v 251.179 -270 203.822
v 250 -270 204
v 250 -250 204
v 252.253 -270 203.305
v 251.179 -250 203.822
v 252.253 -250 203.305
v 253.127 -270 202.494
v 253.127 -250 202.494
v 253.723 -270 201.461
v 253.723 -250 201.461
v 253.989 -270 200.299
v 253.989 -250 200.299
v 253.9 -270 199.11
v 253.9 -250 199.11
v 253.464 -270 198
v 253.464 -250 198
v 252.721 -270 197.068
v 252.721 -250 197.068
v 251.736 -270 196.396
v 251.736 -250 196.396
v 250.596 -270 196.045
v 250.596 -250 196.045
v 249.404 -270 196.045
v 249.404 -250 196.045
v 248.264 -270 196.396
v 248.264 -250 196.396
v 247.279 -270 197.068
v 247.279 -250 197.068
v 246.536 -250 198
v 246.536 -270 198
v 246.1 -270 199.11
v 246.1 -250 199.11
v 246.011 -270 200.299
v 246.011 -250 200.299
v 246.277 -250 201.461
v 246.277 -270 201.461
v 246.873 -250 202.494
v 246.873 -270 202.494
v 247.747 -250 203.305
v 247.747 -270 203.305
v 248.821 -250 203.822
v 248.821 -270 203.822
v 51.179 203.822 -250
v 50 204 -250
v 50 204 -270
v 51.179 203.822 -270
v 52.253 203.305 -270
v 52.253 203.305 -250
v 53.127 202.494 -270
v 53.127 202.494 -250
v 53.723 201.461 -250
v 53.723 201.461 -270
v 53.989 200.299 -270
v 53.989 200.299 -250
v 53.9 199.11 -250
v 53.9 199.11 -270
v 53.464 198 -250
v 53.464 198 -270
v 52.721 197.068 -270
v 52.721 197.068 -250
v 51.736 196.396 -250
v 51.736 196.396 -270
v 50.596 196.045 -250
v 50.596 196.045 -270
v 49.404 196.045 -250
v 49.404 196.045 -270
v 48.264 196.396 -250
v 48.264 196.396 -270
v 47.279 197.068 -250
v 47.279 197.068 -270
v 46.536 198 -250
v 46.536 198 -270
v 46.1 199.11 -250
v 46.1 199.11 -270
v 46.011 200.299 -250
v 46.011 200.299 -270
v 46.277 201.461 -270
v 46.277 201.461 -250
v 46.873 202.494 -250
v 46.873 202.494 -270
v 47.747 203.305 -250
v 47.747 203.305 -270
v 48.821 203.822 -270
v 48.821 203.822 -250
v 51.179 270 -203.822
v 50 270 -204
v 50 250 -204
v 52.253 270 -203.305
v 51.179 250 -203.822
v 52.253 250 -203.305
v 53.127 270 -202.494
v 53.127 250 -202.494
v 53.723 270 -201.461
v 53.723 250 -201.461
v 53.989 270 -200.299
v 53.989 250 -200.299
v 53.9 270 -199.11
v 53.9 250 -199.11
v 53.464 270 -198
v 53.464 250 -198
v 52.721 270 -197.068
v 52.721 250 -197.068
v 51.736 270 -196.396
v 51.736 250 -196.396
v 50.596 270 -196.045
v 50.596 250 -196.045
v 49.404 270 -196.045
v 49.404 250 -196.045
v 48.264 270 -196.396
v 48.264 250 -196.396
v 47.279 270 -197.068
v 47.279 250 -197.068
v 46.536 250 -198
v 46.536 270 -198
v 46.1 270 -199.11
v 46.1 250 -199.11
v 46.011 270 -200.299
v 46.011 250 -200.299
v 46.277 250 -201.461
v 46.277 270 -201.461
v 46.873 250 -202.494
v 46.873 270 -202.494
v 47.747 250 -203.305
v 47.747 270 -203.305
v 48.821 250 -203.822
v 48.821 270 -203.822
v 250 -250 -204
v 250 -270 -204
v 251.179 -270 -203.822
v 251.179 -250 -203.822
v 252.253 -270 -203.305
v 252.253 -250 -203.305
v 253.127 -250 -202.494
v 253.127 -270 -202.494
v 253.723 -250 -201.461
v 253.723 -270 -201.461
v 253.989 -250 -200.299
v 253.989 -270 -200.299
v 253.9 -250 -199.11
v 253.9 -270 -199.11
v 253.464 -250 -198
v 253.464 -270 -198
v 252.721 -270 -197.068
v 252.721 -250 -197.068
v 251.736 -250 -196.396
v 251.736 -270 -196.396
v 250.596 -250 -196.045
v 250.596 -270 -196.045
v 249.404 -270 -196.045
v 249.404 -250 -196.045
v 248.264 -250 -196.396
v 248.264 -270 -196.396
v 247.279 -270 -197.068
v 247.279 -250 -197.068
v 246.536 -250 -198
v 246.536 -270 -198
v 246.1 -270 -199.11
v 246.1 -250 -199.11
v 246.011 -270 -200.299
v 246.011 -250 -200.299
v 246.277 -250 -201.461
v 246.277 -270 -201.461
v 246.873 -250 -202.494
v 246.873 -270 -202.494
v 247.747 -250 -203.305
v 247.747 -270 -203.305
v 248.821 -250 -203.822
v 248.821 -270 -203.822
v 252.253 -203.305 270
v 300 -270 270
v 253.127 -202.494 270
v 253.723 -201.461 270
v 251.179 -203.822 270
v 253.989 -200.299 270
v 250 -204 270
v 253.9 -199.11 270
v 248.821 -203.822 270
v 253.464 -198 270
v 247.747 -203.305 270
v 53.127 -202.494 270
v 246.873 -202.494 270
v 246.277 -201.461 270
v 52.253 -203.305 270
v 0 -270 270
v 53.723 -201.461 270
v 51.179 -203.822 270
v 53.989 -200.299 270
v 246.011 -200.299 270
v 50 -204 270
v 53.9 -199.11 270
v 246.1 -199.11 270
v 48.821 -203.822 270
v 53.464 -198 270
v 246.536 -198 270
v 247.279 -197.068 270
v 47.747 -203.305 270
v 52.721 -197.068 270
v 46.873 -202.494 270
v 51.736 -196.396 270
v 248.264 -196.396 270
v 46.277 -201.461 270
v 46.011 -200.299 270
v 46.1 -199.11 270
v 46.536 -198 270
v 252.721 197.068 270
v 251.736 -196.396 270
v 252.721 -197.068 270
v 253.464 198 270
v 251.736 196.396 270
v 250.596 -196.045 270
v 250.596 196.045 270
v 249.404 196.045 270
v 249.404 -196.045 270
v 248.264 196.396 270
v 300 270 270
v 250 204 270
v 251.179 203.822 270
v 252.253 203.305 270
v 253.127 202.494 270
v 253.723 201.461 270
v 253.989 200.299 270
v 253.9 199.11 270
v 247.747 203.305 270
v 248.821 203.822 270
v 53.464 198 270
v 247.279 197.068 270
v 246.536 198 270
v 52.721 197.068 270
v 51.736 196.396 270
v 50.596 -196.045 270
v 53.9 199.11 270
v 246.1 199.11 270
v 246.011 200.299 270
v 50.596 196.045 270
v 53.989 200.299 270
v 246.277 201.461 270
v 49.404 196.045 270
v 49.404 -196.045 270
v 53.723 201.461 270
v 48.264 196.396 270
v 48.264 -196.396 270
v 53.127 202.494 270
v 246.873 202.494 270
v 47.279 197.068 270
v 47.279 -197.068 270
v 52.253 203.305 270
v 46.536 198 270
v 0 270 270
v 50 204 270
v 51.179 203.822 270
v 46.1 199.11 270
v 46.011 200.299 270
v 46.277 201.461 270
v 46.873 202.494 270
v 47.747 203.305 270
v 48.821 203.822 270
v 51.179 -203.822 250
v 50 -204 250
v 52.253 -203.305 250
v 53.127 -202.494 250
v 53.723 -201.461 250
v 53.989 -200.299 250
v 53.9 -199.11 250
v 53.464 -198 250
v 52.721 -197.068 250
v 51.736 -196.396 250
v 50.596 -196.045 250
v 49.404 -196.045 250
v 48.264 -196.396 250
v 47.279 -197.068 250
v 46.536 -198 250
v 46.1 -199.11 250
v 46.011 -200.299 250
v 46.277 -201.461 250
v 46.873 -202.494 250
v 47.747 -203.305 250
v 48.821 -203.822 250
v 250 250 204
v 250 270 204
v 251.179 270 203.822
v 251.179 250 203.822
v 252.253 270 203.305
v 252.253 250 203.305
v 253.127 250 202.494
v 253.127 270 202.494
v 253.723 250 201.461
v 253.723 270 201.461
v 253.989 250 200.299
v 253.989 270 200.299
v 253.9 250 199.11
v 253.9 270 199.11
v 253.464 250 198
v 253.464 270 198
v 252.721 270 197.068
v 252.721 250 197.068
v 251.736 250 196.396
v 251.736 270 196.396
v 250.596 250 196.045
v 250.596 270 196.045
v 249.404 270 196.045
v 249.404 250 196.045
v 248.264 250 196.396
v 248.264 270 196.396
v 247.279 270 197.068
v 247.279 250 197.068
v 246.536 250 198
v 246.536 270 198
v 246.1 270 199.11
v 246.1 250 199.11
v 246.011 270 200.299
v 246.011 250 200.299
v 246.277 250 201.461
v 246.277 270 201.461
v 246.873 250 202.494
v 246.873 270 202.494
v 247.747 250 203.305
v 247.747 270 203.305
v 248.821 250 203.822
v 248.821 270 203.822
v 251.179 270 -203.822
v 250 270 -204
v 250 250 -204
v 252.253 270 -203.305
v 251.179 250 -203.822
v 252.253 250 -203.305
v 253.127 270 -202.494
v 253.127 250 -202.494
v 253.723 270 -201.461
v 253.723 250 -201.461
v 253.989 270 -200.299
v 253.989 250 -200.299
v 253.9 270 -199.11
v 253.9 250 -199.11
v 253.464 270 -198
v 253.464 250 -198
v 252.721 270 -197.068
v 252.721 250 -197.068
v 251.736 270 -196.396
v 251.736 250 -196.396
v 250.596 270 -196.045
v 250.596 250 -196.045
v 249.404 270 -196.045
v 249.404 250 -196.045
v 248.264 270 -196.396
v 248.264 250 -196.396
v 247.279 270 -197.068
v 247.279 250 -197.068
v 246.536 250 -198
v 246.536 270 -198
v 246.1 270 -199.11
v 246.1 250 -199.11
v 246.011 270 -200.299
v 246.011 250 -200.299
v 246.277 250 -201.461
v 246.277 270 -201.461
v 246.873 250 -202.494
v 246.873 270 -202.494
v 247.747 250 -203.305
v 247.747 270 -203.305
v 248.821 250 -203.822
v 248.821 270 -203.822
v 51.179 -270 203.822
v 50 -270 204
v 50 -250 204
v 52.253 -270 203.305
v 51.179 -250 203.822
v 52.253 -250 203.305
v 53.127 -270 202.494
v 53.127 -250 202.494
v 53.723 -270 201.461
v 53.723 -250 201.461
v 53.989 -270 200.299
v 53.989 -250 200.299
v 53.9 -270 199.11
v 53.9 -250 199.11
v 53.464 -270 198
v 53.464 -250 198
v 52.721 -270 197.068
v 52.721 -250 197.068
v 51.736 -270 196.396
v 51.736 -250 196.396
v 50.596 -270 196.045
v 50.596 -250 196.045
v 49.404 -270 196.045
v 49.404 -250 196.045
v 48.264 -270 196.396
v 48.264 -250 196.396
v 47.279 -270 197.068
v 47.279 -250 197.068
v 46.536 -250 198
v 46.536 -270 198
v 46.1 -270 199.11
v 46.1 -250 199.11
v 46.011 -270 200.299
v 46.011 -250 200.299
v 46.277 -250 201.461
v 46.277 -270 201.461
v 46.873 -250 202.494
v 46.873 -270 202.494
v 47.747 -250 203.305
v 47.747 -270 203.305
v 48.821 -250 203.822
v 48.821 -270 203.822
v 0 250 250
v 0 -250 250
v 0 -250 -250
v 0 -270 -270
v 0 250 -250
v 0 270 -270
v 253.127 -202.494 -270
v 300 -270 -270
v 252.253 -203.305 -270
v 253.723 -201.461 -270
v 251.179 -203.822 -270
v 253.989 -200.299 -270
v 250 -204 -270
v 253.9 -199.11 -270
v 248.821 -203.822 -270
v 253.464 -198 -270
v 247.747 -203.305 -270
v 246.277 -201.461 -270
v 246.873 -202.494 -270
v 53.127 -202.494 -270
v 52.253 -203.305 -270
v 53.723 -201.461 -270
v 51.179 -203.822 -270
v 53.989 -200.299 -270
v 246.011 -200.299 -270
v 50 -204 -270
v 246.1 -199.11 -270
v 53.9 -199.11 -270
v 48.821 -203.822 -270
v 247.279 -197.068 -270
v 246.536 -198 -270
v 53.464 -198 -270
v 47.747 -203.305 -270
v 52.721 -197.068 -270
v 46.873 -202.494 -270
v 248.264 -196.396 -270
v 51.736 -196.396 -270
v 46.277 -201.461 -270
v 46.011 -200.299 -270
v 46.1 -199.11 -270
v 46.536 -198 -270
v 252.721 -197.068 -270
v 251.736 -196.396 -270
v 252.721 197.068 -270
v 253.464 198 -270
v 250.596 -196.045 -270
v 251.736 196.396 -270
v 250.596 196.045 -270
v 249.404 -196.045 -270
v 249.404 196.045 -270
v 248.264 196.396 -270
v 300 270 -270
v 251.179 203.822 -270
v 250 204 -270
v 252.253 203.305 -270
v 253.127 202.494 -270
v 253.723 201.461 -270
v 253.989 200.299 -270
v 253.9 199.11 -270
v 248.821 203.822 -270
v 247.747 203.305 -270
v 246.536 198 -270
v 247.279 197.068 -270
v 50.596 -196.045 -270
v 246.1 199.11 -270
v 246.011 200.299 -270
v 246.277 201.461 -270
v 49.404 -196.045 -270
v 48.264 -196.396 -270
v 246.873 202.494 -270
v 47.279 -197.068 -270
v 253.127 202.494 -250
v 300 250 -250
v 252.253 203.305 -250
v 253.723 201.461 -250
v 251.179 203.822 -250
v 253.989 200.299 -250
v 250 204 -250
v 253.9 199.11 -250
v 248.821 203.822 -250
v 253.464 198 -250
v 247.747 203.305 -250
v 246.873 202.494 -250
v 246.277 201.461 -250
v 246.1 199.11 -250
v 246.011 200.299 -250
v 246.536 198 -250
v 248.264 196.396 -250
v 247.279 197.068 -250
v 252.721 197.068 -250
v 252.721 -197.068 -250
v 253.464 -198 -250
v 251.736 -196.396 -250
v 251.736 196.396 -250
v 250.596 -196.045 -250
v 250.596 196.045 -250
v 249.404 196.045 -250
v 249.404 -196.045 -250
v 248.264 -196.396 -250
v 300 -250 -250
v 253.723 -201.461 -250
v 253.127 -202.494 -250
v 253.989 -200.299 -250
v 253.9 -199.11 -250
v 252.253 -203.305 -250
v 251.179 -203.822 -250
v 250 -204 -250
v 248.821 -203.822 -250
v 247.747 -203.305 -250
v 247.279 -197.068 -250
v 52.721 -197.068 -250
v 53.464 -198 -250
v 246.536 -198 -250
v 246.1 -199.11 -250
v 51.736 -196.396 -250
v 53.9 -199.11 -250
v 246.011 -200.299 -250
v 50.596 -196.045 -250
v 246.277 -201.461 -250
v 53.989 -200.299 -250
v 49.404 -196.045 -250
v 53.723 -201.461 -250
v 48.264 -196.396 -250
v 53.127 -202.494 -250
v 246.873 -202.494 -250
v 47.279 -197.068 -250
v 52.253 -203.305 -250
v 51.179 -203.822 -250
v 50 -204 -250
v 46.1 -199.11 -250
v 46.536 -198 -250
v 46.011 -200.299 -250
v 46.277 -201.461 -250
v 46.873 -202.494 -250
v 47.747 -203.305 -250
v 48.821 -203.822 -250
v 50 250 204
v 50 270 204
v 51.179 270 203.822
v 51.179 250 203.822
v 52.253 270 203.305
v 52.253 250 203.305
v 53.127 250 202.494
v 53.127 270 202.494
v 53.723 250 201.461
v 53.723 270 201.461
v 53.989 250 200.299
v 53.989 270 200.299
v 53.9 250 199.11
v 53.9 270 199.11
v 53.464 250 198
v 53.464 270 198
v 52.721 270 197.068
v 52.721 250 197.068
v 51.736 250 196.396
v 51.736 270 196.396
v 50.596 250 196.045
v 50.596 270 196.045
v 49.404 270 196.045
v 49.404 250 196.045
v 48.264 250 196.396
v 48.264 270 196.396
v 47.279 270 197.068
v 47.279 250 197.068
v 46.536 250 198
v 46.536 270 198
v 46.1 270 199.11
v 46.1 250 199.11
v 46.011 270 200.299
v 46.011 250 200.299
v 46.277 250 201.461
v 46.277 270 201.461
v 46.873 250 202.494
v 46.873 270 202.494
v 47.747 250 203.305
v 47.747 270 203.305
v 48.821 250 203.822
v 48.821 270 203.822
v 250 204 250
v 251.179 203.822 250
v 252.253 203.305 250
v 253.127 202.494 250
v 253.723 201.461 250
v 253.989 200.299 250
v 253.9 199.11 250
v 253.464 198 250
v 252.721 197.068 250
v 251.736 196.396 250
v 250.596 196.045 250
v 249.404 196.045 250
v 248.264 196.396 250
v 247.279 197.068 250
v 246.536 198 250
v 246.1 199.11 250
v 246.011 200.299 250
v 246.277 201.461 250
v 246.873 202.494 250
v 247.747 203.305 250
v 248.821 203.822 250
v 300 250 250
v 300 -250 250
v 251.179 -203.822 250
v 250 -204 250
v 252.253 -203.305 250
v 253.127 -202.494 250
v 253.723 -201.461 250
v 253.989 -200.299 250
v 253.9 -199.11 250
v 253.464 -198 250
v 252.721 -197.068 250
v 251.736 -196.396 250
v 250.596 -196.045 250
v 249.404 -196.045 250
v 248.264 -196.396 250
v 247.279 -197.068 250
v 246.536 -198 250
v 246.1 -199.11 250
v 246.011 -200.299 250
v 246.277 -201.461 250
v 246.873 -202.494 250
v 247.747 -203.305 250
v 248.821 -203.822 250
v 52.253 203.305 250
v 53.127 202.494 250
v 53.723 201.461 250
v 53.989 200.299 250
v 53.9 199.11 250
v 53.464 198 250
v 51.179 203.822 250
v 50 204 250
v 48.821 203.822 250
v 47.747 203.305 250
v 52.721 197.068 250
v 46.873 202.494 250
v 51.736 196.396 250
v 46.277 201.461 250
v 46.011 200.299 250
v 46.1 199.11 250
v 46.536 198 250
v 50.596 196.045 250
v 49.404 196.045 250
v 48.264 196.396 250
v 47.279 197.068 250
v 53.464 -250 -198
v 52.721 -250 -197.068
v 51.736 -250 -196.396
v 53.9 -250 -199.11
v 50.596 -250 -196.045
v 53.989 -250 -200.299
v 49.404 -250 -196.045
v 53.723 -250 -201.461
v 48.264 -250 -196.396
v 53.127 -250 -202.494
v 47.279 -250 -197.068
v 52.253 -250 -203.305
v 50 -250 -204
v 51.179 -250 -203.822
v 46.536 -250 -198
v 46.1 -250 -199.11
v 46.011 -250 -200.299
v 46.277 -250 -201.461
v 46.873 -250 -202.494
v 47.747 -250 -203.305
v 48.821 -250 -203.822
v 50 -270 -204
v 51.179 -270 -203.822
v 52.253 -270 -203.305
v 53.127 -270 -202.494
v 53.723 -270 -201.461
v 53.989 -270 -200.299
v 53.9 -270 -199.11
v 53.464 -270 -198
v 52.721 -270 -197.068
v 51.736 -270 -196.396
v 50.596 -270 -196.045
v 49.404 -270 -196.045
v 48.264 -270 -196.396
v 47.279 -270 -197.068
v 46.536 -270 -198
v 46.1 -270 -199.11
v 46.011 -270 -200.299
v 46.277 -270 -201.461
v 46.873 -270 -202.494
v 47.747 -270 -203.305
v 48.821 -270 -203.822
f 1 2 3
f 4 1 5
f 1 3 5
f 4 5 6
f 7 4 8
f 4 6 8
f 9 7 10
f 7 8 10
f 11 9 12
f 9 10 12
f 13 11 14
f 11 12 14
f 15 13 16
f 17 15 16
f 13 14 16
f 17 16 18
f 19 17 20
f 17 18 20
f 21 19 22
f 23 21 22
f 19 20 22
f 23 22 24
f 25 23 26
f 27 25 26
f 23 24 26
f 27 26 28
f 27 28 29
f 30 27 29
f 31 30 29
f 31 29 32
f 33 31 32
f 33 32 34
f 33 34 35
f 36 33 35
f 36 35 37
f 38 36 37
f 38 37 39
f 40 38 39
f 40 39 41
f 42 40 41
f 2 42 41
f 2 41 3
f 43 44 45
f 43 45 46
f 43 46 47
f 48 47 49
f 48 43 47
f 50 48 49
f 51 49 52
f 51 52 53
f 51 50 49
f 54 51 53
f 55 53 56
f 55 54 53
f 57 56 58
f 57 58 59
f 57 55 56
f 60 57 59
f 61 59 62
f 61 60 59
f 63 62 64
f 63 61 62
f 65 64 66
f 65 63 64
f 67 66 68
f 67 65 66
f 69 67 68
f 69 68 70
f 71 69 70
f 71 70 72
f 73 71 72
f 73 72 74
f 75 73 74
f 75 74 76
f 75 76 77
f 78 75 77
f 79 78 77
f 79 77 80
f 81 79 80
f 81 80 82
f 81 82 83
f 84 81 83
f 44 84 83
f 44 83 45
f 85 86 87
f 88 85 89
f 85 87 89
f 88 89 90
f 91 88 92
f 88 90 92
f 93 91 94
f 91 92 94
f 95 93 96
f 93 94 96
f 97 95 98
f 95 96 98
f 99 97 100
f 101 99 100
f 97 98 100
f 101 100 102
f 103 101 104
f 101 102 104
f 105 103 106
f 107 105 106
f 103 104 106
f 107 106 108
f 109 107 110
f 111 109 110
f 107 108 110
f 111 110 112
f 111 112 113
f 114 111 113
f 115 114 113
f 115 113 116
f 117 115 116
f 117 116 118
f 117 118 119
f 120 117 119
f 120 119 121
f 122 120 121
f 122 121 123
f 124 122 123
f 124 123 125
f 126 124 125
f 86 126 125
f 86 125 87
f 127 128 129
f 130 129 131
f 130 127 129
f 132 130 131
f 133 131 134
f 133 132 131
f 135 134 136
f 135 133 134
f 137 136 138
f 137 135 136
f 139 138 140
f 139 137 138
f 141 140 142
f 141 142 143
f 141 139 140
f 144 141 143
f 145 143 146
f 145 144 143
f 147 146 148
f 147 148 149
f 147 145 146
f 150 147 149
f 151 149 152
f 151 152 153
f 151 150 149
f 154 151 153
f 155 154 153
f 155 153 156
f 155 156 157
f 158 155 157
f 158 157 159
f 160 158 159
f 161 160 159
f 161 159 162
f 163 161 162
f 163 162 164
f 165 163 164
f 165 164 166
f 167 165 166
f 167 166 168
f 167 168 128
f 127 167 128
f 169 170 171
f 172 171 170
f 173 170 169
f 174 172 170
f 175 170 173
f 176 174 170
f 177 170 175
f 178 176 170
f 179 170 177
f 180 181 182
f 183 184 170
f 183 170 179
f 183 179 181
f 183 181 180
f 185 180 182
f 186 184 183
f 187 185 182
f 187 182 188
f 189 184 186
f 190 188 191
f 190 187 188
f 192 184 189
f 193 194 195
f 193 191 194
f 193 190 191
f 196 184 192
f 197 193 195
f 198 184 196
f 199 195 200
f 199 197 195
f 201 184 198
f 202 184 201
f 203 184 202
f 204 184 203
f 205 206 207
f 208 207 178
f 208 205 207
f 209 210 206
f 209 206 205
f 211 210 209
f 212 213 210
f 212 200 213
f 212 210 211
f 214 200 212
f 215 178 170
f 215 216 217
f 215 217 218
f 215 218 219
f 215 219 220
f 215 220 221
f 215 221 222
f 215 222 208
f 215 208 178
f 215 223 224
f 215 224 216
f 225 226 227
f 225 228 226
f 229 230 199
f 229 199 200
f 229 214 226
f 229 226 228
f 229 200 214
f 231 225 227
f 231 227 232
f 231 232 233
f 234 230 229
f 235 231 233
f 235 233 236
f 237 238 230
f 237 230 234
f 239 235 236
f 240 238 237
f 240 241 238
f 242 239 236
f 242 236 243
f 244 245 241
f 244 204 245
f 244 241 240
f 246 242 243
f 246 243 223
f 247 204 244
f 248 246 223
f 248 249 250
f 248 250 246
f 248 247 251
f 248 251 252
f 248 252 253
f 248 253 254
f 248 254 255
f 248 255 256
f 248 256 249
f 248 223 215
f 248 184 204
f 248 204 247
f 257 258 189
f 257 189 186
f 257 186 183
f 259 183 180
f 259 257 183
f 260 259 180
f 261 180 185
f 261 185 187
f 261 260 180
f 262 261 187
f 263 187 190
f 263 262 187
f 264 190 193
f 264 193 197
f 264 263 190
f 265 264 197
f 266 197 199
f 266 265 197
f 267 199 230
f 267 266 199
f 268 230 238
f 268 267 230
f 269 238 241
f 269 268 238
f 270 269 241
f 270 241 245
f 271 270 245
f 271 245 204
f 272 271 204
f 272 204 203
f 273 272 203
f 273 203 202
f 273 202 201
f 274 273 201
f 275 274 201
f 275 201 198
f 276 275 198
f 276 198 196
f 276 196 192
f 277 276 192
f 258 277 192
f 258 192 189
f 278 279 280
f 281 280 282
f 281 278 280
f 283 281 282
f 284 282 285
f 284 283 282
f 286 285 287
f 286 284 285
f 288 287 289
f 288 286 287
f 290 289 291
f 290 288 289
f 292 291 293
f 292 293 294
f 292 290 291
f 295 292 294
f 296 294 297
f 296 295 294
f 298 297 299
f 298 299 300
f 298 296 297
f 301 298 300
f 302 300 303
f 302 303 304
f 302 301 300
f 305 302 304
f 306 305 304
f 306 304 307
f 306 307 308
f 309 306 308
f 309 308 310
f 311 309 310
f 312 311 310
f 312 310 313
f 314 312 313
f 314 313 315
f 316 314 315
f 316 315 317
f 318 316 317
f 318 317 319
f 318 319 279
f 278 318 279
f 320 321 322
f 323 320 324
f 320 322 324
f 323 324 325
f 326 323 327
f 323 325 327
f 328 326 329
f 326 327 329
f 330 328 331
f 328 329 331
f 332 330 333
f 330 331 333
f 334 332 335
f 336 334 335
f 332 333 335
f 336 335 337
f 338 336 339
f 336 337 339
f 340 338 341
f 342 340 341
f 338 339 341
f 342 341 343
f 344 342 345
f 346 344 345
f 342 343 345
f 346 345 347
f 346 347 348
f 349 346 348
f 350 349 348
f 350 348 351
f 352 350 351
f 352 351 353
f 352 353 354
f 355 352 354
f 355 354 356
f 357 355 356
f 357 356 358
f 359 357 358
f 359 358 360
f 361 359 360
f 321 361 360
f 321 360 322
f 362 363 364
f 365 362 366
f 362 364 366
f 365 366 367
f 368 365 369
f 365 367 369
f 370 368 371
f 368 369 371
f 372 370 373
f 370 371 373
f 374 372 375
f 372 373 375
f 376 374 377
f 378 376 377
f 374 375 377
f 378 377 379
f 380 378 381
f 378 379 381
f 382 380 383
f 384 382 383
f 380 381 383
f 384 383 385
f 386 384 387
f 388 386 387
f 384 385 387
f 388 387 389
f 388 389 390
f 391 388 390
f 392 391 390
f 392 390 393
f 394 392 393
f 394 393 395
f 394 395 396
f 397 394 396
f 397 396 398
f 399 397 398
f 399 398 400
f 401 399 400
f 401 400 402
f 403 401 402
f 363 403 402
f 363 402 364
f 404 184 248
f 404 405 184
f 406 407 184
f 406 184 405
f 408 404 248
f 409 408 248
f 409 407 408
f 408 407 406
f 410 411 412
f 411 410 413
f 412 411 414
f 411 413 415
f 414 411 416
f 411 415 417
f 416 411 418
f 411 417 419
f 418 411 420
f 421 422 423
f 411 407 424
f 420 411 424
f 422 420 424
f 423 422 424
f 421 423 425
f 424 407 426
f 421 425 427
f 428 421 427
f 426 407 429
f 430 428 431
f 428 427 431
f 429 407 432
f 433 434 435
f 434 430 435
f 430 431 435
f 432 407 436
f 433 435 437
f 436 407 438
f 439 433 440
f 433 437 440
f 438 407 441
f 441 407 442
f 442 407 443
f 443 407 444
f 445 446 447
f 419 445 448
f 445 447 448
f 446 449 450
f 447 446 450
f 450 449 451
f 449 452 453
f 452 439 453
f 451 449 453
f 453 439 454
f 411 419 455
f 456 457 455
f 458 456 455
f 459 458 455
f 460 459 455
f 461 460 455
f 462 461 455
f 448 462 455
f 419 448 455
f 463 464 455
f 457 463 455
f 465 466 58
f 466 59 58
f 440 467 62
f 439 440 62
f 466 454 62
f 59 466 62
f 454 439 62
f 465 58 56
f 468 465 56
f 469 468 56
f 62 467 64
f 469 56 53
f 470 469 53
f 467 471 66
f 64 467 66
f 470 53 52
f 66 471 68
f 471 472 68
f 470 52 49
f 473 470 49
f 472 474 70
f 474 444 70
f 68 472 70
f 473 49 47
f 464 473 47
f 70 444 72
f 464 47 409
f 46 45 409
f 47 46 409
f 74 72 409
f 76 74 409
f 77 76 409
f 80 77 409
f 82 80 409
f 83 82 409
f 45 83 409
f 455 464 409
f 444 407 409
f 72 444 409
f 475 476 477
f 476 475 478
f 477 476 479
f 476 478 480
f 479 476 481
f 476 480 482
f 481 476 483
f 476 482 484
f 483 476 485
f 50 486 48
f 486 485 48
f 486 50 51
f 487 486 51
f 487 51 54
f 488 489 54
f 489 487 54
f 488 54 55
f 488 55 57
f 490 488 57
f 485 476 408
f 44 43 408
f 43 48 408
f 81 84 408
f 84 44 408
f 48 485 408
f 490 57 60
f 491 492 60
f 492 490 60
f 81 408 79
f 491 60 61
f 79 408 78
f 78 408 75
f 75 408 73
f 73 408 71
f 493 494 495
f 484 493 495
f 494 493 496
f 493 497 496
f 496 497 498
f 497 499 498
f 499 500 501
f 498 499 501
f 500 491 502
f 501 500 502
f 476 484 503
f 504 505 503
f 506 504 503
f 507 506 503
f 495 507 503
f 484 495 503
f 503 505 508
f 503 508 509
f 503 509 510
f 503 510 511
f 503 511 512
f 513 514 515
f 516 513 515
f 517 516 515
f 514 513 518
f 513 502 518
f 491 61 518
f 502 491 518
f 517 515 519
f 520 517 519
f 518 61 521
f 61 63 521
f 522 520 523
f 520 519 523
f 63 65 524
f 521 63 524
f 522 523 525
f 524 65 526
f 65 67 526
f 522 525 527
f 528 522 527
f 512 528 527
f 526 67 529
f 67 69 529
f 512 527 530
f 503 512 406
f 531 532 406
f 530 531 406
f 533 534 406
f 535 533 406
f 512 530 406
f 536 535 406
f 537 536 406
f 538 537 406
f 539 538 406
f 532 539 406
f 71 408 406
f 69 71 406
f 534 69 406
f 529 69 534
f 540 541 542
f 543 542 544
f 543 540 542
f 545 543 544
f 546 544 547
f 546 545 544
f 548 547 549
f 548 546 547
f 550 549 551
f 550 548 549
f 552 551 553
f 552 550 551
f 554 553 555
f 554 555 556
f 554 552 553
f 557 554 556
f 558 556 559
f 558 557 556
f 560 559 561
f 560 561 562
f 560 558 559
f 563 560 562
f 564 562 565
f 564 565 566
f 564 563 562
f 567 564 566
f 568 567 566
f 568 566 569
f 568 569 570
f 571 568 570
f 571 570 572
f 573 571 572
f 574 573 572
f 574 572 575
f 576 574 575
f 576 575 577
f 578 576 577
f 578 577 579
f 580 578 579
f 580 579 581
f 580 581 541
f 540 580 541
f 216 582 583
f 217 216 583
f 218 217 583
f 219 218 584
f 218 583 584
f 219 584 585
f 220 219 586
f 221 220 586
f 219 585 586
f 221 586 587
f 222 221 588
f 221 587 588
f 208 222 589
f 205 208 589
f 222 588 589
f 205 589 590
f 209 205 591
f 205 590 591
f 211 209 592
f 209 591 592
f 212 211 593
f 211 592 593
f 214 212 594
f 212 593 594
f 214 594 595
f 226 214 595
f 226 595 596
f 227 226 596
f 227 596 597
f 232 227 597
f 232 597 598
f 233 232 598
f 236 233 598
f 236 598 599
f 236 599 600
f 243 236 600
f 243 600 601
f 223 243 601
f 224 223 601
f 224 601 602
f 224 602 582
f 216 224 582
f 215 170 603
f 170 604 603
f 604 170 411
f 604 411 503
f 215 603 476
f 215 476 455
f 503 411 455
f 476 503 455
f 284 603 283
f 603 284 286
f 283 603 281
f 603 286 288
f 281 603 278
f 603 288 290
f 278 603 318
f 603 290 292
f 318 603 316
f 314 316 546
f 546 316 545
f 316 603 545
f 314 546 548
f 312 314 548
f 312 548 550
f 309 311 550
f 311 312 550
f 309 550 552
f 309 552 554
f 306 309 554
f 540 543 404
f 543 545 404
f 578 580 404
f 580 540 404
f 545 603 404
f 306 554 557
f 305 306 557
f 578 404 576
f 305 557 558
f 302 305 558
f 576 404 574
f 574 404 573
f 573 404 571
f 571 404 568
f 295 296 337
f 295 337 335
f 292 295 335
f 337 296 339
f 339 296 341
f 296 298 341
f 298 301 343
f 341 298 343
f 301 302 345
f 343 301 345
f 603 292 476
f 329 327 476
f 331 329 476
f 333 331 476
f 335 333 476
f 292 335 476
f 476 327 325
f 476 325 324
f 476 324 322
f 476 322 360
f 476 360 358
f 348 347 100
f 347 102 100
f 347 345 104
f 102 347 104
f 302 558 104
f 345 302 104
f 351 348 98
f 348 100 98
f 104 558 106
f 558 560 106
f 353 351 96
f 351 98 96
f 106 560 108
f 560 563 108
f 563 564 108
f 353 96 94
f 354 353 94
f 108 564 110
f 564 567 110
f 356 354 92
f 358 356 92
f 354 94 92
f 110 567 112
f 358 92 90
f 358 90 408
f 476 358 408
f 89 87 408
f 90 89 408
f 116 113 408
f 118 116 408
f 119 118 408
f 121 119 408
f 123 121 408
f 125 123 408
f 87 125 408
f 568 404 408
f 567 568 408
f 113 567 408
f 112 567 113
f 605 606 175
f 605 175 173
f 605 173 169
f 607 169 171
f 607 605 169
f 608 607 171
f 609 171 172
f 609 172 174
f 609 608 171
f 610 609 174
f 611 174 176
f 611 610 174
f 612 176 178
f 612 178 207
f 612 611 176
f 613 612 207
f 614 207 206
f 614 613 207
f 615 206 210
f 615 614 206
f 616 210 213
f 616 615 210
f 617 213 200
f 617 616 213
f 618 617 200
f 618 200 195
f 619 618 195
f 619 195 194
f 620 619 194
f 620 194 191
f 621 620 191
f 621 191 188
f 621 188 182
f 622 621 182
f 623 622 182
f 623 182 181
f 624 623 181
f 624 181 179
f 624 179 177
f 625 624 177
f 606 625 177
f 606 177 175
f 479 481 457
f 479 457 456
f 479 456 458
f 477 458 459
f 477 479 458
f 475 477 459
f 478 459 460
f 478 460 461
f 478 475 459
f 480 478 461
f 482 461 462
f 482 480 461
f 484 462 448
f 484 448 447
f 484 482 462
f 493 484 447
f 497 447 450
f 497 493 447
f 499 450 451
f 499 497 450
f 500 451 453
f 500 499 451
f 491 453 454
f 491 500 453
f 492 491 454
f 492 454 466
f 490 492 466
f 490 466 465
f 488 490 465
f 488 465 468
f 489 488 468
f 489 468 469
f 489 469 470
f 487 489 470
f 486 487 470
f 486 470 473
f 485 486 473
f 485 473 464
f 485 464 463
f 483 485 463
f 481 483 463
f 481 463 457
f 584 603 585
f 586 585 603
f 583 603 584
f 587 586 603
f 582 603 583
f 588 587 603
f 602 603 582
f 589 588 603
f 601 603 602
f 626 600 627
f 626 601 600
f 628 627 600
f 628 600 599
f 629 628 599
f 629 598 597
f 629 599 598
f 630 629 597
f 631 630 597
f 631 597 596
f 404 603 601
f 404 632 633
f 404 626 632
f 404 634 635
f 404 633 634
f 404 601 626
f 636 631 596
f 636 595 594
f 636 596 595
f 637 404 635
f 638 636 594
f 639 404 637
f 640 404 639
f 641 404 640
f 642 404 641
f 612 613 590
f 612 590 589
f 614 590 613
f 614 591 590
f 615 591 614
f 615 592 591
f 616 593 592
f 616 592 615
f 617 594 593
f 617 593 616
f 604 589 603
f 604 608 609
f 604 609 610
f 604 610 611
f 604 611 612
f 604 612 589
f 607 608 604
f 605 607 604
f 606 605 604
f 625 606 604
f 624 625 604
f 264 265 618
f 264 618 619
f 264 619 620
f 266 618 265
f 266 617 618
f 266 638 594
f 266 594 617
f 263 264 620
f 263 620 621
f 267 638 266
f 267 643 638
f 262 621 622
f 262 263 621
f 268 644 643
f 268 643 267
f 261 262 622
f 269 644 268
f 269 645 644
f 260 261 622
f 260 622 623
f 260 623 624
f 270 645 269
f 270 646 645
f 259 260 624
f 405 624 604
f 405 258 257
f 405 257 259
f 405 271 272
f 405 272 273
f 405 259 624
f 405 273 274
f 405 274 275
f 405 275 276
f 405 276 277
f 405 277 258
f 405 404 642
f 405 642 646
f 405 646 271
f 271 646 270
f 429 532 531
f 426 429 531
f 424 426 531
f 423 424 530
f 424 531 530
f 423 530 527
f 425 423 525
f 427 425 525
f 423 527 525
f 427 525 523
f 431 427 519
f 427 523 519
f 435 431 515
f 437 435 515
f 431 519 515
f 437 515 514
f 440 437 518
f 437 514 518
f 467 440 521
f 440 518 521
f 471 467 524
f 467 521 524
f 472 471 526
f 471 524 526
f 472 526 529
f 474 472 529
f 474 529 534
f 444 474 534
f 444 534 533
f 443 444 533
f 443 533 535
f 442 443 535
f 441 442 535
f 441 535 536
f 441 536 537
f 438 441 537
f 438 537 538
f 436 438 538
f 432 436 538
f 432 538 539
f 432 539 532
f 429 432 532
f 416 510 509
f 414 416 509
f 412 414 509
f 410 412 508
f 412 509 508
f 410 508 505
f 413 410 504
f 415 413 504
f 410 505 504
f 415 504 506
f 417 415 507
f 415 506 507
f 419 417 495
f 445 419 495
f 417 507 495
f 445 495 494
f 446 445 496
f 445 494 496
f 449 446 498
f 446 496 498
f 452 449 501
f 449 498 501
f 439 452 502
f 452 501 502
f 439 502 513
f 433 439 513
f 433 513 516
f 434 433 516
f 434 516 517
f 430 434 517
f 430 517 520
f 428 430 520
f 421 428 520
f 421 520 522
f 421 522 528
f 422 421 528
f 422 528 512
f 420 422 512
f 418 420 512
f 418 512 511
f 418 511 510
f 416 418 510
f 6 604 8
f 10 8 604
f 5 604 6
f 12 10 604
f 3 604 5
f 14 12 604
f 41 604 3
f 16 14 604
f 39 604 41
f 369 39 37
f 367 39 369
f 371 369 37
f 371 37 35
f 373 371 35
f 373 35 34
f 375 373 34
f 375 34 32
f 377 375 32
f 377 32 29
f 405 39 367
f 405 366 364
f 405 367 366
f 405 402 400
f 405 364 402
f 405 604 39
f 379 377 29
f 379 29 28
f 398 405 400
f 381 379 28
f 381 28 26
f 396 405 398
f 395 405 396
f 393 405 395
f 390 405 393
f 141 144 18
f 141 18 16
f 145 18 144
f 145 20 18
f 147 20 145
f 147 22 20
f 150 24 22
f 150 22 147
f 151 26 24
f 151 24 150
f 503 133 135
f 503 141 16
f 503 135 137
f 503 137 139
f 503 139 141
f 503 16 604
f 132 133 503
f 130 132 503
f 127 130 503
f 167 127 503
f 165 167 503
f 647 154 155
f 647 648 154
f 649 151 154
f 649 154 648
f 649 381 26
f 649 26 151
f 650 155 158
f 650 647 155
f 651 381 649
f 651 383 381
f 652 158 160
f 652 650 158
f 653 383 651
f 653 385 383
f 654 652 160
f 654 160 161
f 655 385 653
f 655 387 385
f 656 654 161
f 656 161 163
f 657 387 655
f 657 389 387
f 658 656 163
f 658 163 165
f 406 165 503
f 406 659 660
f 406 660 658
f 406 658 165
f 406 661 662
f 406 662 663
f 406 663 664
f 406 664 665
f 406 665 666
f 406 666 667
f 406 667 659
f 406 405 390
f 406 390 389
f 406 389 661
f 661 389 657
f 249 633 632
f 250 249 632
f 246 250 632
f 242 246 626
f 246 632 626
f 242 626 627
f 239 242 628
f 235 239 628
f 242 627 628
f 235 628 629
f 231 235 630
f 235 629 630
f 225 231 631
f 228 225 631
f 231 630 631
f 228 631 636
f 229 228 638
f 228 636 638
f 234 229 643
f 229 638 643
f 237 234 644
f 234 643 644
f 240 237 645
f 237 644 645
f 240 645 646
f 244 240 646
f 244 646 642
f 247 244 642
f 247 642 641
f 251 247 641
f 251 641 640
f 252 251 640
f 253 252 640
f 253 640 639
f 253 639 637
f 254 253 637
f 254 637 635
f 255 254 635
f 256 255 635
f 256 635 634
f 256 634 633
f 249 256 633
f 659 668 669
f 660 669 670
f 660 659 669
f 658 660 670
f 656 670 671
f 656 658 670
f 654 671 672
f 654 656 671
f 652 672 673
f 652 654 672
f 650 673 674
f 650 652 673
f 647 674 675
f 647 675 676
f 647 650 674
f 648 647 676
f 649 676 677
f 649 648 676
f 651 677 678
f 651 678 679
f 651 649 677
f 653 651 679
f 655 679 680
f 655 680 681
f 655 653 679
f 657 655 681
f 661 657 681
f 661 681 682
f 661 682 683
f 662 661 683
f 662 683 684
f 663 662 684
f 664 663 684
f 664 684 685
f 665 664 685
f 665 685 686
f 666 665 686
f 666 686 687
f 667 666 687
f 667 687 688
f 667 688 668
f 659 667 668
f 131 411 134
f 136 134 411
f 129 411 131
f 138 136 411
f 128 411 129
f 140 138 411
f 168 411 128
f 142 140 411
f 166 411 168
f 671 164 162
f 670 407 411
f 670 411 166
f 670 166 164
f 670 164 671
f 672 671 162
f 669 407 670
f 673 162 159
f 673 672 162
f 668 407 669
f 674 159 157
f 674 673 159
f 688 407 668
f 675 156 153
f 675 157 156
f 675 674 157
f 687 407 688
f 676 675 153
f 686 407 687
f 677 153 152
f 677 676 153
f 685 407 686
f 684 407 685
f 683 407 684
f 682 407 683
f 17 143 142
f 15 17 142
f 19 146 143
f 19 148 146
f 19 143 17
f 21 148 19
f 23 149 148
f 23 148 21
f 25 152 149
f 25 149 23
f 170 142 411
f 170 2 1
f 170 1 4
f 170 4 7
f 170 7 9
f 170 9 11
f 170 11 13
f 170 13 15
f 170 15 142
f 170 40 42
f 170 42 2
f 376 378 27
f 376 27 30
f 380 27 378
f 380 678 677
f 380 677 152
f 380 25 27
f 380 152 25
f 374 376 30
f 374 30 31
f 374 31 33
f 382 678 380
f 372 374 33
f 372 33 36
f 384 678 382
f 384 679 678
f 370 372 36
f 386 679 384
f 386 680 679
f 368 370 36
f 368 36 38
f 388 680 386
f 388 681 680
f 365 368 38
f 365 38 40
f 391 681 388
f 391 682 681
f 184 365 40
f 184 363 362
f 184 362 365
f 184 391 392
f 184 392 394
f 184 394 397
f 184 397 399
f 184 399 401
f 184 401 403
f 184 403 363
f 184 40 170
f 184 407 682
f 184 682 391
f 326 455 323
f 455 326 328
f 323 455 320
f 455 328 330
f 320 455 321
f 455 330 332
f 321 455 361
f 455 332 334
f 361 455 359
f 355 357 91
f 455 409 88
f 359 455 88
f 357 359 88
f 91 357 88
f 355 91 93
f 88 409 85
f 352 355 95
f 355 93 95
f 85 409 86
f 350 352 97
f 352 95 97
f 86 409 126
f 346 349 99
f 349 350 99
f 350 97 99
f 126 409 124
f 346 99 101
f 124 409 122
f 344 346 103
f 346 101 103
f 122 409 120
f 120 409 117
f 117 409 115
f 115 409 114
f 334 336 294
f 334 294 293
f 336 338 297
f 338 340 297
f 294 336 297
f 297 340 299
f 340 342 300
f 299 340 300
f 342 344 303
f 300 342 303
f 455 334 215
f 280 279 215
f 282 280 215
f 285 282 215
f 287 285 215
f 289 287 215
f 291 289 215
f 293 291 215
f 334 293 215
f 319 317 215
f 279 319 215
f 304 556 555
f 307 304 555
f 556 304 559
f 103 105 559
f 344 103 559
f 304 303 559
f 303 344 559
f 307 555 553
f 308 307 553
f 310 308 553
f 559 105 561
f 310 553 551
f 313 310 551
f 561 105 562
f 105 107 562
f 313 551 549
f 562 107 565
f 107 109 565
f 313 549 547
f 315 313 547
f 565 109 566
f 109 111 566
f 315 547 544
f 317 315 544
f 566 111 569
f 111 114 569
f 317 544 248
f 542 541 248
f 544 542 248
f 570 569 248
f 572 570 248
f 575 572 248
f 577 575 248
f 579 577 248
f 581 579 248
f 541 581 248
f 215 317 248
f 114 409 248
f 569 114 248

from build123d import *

# Parameters (mm, degrees)
EXTRUDE_1_DEPTH     = 300
SKETCH_2_R          = 4
CUT_EXTRUDE_1_DEPTH = 405.103947024


with BuildPart() as part:
    # 草图1 → 凸台-拉伸1 (new body)
    with BuildSketch(Plane(origin=(0, 0, 0), x_dir=(0, 0, -1), z_dir=(1, 0, 0))):
        Polygon((-250, 0), (-250, 250), (-270, 270), (-270, 0), align=None)
    extrude(amount=EXTRUDE_1_DEPTH)

    # 草图2 → 切除-拉伸1 (cut, through all)
    with BuildSketch(Plane(origin=(0, 0, 250), x_dir=(-1, 0, 0), z_dir=(0, 0, -1))):
        with Locations(Location((-250, 200, 0), (0, 0, 90))):
            Circle(SKETCH_2_R)
        with Locations(Location((-50, 200, 0), (0, 0, 90))):
            Circle(SKETCH_2_R)
    extrude(amount=-CUT_EXTRUDE_1_DEPTH, mode=Mode.SUBTRACT)

    # 镜向1: part across plane


with BuildPart() as part_1:
    add(part.part)
    add(part.part.mirror(Plane(origin=(300, 270, 270), x_dir=(0, 0.7071067811865485, 0.7071067811865466), z_dir=(0, -0.7071067811865466, 0.7071067811865485))))

    # 镜向2: part across plane


with BuildPart() as part_2:
    add(part_1.part)
    add(part_1.part.mirror(Plane(origin=(300, 250, 0), x_dir=(1, 0, 0), z_dir=(0, 0, 1))))

    # 镜向3: part across plane


with BuildPart() as part_3:
    add(part_2.part)
    add(part_2.part.mirror(Plane(origin=(300, 0, -250), x_dir=(0, 0, 1), z_dir=(0, 1, 0))))


solid = part_3.part
